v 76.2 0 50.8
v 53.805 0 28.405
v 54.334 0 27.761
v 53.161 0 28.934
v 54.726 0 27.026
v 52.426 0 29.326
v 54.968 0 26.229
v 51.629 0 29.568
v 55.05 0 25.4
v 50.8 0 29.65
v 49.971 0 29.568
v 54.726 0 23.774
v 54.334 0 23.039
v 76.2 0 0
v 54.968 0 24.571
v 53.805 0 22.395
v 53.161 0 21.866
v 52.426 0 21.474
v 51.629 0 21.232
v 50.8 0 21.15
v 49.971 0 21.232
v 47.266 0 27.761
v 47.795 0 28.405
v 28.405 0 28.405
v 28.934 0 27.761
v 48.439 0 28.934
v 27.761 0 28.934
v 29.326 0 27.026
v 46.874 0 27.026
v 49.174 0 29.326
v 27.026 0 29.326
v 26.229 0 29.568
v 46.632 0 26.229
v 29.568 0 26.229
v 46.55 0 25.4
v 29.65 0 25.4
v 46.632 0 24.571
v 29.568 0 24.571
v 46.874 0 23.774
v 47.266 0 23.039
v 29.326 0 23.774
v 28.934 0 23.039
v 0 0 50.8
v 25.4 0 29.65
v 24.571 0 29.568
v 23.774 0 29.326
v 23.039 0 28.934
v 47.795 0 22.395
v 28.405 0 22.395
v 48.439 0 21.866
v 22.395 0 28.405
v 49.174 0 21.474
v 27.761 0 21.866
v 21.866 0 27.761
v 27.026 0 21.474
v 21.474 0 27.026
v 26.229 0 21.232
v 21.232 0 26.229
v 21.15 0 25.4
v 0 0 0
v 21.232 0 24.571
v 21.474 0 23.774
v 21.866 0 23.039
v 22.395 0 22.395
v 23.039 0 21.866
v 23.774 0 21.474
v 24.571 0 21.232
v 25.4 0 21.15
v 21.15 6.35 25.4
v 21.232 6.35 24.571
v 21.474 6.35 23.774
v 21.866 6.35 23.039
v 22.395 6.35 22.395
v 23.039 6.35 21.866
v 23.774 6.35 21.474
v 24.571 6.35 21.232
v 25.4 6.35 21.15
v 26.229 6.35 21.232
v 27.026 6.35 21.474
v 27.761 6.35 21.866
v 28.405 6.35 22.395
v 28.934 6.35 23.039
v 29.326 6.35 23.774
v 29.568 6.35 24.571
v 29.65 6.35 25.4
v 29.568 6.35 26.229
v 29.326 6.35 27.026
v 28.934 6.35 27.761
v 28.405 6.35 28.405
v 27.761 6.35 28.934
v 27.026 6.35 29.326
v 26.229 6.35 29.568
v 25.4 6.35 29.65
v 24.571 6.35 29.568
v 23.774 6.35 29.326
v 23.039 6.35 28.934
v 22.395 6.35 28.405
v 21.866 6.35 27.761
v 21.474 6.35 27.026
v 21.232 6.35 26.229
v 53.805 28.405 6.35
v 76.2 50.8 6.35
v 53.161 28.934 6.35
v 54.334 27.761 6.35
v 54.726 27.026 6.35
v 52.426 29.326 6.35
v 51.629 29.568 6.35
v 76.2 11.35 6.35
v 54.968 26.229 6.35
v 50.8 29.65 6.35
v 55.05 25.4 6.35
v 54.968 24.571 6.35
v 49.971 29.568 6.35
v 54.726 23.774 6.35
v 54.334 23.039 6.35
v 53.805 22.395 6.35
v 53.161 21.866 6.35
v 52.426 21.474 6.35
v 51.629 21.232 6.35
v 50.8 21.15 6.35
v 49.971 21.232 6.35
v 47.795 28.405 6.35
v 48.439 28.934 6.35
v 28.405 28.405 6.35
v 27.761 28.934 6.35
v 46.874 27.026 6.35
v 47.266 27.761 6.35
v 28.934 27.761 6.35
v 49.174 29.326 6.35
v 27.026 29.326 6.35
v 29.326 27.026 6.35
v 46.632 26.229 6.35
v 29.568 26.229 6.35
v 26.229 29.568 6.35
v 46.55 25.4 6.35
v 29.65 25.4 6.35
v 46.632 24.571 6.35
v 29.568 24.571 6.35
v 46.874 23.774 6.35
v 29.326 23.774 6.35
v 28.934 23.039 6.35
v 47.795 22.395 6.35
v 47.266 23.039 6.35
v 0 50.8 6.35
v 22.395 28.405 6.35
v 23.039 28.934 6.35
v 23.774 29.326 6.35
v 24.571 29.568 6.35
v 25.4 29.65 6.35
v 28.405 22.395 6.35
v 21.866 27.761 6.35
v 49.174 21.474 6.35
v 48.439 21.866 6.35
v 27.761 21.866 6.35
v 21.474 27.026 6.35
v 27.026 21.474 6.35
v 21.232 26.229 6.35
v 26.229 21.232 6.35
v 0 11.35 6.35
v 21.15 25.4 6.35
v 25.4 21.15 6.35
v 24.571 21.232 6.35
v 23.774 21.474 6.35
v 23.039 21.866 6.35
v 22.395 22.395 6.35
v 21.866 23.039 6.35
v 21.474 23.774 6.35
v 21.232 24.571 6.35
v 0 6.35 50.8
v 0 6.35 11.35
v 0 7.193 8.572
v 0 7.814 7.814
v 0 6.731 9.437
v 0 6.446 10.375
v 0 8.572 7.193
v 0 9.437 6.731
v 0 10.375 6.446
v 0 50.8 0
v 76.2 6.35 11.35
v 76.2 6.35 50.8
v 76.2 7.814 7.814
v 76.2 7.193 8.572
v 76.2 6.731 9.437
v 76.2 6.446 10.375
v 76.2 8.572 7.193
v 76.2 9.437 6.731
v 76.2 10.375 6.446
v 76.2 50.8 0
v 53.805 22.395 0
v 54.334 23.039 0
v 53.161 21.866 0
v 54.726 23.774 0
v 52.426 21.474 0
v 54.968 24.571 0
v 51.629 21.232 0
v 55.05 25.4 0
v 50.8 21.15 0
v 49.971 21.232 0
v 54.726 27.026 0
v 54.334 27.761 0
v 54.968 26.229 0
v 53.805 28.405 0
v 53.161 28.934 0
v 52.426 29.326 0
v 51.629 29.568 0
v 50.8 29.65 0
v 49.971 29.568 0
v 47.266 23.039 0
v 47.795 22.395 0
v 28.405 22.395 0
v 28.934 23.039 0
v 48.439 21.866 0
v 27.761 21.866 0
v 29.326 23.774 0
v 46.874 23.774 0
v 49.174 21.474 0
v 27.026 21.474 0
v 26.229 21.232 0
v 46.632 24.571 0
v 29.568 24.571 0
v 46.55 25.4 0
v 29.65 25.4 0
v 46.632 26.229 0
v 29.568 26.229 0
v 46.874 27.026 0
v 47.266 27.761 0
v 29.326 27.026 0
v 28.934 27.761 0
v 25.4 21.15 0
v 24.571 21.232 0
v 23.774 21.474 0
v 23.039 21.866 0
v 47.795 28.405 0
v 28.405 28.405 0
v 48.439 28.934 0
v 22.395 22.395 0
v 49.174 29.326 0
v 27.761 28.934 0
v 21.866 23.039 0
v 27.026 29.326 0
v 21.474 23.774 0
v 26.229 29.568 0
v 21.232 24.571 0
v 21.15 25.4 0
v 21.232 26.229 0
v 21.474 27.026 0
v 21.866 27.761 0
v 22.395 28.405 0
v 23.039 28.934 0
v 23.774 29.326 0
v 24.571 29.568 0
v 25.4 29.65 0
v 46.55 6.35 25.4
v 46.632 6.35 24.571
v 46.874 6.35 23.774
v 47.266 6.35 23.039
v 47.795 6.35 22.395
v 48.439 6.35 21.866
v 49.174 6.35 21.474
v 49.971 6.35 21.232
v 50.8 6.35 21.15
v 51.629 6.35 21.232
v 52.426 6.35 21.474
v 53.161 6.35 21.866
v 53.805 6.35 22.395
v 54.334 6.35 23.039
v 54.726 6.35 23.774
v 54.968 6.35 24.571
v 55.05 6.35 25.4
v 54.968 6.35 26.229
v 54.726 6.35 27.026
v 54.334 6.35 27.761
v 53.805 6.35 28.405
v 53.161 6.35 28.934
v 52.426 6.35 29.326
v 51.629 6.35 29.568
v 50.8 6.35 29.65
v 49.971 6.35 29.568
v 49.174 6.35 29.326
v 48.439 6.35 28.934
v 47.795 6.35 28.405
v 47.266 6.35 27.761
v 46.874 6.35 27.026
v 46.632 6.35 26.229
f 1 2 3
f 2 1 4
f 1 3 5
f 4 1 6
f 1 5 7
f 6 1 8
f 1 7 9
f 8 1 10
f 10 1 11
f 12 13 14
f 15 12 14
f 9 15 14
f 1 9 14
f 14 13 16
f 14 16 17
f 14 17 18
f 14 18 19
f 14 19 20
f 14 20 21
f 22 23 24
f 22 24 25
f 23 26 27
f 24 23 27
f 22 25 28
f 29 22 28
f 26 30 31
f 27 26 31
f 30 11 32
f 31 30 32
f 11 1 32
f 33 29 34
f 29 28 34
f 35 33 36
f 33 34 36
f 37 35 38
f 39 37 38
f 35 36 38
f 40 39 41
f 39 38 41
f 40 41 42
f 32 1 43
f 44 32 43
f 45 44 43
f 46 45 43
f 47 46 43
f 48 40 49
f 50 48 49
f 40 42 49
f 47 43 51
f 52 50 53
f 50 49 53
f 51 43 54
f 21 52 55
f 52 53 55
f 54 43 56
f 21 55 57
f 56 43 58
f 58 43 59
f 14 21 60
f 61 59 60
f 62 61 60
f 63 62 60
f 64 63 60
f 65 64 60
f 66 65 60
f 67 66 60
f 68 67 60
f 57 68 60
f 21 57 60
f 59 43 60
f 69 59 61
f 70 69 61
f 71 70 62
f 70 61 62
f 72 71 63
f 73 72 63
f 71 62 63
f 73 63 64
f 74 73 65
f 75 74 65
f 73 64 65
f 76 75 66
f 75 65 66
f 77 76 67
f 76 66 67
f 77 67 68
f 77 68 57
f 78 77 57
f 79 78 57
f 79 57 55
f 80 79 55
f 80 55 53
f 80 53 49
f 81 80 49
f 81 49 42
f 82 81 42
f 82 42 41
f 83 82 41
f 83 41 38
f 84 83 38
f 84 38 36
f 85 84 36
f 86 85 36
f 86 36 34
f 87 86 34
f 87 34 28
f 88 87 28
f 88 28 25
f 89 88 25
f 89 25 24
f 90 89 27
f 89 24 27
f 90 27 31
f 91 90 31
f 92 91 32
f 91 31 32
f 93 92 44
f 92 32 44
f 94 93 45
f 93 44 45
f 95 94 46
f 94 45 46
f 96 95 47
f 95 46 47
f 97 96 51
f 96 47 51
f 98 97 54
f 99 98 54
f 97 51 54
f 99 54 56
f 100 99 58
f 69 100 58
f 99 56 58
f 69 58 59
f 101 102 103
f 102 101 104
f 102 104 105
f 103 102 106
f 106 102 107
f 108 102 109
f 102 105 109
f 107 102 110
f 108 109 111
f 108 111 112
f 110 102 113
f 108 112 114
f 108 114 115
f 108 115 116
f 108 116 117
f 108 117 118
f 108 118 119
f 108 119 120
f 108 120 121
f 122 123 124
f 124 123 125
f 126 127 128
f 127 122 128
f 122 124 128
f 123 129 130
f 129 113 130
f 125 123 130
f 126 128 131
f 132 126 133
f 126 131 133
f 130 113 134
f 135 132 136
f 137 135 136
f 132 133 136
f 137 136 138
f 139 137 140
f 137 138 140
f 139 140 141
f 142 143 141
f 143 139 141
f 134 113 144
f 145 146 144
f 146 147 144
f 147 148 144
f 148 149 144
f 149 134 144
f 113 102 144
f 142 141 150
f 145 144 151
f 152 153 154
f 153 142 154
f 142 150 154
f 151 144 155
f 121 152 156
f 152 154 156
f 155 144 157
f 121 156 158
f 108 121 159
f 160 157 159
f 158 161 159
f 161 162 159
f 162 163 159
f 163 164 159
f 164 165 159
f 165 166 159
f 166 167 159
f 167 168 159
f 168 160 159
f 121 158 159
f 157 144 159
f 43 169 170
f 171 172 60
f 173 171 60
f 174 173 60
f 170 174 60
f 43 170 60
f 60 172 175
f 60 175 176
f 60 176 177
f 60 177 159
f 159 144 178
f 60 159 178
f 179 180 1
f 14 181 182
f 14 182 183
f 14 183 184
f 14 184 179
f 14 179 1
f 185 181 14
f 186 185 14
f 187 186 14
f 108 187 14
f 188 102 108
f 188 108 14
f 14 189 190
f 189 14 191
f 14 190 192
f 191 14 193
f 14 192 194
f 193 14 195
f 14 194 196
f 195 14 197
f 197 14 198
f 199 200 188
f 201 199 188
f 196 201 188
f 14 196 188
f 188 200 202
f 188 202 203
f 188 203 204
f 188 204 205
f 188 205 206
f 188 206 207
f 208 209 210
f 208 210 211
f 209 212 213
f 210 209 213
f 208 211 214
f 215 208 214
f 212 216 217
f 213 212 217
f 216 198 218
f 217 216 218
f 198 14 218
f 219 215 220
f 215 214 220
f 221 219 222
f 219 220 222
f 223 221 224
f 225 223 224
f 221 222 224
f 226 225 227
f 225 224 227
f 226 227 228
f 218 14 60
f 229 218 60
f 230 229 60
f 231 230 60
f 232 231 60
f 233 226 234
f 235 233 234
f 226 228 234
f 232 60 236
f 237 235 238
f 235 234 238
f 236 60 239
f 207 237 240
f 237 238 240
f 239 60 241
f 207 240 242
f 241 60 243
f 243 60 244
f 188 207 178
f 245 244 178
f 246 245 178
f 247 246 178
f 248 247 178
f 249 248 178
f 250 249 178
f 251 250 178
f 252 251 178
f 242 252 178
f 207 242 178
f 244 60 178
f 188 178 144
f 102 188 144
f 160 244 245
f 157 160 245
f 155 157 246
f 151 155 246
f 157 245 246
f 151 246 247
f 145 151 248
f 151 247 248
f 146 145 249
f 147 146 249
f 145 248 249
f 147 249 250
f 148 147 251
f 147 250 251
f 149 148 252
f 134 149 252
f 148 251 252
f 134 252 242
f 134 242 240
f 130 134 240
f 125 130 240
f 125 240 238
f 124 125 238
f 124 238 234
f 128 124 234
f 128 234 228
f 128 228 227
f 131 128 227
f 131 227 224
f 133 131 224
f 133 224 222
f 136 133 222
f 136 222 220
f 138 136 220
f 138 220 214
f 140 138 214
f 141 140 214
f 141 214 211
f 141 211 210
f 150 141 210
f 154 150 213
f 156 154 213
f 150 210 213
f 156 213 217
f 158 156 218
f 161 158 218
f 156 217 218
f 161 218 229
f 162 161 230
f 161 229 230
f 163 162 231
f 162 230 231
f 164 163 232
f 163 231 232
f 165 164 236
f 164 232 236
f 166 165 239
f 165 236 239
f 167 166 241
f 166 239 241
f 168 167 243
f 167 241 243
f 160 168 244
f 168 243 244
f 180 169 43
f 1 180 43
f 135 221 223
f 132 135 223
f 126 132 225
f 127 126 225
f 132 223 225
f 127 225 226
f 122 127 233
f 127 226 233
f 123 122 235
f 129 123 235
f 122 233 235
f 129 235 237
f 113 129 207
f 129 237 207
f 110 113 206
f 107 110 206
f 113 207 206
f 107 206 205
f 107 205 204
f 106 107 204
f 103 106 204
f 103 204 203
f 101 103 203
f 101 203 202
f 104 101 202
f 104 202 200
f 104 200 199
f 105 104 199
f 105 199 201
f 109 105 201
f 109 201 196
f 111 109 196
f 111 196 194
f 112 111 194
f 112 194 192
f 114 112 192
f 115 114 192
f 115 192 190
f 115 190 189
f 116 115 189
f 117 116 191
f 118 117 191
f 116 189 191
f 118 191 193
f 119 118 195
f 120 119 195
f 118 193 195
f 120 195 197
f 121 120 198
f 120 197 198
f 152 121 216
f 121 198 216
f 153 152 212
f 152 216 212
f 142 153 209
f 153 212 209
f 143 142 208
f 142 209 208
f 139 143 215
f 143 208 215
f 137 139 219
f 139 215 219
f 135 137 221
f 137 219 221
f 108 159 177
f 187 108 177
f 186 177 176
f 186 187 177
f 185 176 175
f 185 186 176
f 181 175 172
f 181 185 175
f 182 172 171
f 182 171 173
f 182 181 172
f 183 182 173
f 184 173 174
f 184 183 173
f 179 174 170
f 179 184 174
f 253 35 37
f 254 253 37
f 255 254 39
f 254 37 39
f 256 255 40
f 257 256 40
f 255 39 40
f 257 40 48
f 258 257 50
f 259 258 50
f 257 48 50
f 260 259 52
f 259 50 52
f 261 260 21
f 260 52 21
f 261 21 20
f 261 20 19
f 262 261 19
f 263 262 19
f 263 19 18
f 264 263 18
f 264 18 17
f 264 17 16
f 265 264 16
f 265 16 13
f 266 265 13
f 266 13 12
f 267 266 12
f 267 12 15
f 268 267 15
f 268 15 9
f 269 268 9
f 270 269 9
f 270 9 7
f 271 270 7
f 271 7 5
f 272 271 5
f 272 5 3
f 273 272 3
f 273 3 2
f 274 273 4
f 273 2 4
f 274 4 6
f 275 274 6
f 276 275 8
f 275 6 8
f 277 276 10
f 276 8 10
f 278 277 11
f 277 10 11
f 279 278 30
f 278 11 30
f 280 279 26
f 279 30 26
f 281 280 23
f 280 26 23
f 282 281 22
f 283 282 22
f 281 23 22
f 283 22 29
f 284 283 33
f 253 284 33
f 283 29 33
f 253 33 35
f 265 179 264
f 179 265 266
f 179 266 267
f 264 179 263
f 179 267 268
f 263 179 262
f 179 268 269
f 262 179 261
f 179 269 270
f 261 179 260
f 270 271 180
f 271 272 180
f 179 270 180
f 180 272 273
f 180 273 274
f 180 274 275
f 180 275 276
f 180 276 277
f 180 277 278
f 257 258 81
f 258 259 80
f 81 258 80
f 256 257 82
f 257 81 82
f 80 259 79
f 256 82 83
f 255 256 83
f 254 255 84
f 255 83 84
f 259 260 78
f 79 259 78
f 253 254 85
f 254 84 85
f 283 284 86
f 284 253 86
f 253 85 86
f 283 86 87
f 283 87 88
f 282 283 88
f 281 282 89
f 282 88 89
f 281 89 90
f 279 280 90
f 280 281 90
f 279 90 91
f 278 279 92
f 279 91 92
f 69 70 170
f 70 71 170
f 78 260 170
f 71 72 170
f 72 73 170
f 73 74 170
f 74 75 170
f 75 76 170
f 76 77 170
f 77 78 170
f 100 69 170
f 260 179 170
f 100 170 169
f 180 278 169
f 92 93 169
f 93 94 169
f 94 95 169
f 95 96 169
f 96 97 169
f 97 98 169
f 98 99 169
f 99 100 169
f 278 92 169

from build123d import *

# Parameters (mm, degrees)
BOSS_EXTRUDE1_DEPTH              = 76.2
TAP_DRILL_FOR_M10X1_5_TAP1_D     = 8.5
TAP_DRILL_FOR_M10X1_5_TAP2_D     = 8.5
TAP_DRILL_FOR_M10X1_5_TAP2_DEPTH = 20
TAP_DRILL_FOR_M10X1_5_TAP2_TIP   = 2.553657631
FILLET1_R                        = 5


with BuildPart() as part:
    # Sketch1 → Boss-Extrude1 (new body)
    with BuildSketch(Plane(origin=(0, 0, 0), x_dir=(0, 0, -1), z_dir=(1, 0, 0))):
        Polygon((0, 0), (0, 50.8), (-6.35, 50.8), (-6.35, 6.35), (-50.8, 6.35), (-50.8, 0), align=None)
    extrude(amount=BOSS_EXTRUDE1_DEPTH)

    # Tap Drill for M10x1.5 Tap1 (through all)
    with Locations(Plane(origin=(0, 6.35, 0), x_dir=(1, 0, 0), z_dir=(0, 1, 0))):
        with Locations((25.4, -25.4), (50.8, -25.4)):
            Hole(TAP_DRILL_FOR_M10X1_5_TAP1_D / 2)

    # Tap Drill for M10x1.5 Tap2
    with Locations(Plane.XY.offset(6.35)):
        with Locations((25.4, 25.4), (50.8, 25.4)):
            Hole(TAP_DRILL_FOR_M10X1_5_TAP2_D / 2, depth=TAP_DRILL_FOR_M10X1_5_TAP2_DEPTH)
            with Locations((0, 0, -(TAP_DRILL_FOR_M10X1_5_TAP2_DEPTH + TAP_DRILL_FOR_M10X1_5_TAP2_TIP / 2))):  # 118° drill point
                Cone(0, TAP_DRILL_FOR_M10X1_5_TAP2_D / 2, TAP_DRILL_FOR_M10X1_5_TAP2_TIP, mode=Mode.SUBTRACT)

    # Fillet1
    fillet1_edges = [part.edges().sort_by_distance(p)[0] for p in [
        (38.1, 6.35, 6.35),
    ]]
    fillet(fillet1_edges, radius=FILLET1_R)


solid = part.part
